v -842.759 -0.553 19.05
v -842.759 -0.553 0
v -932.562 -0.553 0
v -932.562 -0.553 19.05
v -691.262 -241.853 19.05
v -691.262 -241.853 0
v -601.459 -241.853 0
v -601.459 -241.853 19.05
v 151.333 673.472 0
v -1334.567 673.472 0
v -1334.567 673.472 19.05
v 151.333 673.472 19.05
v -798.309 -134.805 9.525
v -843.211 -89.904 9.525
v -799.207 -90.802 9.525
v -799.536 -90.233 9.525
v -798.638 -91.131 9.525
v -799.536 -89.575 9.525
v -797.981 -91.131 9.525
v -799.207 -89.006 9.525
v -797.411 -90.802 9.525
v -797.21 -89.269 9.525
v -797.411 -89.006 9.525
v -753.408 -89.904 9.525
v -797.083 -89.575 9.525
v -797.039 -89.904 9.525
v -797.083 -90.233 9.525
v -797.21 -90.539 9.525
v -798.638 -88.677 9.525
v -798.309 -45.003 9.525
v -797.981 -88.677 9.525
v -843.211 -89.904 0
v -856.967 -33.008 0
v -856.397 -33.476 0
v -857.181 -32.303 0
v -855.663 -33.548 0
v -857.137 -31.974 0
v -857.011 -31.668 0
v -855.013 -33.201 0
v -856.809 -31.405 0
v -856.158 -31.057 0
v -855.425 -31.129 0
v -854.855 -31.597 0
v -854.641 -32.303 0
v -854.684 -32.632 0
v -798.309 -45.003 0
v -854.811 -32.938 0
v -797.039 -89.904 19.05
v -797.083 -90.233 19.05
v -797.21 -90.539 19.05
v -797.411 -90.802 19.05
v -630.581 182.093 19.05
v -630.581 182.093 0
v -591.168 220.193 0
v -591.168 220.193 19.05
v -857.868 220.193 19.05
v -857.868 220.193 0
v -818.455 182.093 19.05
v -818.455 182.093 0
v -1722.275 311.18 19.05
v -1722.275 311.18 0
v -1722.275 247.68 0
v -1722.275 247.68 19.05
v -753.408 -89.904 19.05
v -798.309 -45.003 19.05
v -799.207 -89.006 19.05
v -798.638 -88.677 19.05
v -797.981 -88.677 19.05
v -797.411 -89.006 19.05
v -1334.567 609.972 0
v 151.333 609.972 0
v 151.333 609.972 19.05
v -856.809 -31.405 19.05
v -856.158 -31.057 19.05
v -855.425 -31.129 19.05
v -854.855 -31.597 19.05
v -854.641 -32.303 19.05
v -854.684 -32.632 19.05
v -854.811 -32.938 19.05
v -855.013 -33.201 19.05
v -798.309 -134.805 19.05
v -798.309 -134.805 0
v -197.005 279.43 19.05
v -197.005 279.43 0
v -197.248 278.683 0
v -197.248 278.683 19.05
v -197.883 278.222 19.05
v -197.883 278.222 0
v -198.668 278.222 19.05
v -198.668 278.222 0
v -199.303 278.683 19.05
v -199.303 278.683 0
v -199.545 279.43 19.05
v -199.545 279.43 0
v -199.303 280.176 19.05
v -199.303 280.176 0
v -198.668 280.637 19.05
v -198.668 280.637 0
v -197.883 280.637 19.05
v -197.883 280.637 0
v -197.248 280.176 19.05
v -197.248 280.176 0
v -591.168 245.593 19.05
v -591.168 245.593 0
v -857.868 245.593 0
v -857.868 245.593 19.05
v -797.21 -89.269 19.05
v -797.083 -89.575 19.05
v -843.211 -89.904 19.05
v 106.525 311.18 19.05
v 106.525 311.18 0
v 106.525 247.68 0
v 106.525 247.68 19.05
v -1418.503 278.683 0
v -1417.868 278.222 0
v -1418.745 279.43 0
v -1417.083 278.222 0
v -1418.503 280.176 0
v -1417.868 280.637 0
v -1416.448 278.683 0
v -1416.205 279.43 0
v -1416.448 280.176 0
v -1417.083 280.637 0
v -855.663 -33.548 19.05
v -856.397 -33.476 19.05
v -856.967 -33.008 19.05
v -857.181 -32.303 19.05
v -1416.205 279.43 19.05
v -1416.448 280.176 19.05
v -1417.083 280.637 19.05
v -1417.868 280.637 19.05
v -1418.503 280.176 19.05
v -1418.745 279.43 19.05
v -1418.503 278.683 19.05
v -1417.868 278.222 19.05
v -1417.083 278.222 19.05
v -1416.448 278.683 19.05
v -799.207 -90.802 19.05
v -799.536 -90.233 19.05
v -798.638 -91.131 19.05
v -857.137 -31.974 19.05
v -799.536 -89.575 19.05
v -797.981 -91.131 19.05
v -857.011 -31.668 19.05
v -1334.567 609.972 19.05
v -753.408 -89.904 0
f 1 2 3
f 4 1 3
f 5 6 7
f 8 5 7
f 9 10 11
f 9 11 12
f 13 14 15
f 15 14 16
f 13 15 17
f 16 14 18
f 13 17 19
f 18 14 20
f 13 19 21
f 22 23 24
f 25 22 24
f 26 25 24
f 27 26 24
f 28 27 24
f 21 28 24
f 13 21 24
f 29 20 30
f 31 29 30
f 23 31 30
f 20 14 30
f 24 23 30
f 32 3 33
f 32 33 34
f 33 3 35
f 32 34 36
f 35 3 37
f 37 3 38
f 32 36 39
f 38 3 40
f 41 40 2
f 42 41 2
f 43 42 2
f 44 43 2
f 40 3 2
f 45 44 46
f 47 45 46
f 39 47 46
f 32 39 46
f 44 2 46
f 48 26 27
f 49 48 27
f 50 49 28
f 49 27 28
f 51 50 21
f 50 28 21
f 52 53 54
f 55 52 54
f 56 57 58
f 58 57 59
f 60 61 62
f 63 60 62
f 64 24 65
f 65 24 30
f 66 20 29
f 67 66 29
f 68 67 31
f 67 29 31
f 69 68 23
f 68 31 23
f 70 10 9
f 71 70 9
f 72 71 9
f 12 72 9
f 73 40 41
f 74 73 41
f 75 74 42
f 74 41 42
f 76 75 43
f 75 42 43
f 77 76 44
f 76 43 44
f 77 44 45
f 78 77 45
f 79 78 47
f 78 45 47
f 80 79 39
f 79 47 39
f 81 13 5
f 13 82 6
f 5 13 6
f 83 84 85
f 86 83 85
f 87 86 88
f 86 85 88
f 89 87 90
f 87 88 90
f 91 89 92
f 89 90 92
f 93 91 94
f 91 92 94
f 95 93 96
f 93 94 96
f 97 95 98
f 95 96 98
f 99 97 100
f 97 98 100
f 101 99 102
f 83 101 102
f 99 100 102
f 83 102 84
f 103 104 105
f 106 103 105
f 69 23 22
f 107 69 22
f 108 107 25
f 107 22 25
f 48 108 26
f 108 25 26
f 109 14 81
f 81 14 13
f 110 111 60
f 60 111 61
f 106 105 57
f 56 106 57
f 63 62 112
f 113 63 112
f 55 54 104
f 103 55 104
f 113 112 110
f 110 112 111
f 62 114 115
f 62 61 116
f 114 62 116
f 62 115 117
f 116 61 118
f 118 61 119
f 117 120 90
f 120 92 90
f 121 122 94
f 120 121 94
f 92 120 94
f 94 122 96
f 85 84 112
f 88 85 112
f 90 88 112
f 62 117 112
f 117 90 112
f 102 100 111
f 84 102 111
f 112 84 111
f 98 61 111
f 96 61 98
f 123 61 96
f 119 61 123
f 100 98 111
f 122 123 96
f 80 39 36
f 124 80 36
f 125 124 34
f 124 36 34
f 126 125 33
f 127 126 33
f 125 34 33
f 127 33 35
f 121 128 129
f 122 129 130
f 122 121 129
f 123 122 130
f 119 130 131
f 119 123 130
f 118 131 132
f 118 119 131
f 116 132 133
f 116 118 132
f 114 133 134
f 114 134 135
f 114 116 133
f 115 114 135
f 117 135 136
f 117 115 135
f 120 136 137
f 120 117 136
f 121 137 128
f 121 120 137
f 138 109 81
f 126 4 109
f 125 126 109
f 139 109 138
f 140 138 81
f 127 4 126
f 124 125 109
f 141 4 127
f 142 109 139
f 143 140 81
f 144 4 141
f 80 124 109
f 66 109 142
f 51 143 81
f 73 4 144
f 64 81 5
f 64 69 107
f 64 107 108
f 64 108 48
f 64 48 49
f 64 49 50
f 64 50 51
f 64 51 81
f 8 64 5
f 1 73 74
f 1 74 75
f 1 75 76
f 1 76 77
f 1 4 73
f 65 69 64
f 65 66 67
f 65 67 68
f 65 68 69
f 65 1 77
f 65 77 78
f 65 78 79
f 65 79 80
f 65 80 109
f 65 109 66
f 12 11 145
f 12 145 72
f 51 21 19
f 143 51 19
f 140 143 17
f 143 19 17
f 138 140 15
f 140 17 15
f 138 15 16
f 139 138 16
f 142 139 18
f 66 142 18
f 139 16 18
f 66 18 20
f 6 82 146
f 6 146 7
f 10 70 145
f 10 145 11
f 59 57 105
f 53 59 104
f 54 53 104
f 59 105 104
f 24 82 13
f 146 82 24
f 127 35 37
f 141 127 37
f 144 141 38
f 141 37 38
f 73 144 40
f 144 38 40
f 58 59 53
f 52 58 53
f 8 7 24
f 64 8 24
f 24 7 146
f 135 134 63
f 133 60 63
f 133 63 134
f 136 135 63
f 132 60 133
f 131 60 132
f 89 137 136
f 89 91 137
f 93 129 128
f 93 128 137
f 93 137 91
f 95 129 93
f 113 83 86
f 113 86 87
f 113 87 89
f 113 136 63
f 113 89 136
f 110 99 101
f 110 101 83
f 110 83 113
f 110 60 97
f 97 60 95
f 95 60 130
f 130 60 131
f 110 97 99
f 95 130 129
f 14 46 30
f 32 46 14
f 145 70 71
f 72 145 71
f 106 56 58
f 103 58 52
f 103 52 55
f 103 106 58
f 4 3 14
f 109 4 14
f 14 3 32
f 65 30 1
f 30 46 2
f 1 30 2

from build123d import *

# Parameters (mm, degrees)
F0_R     = 1.27
F3_DEPTH = 19.05
F4_DEPTH = 19.05
F5_DEPTH = 19.05
F6_DEPTH = 9.525
F7_W     = 1485.9
F7_H     = 63.5
F8_DEPTH = 19.05


with BuildPart() as f3:
    # F0 (on Top) → F3 (new body)
    with BuildSketch(Plane.XY):
        Polygon((106.5247591868, 311.1795735657), (-1722.2752408132, 311.1795735657), (-1722.2752408132, 247.6795735657), (106.5247591868, 247.6795735657), (106.5247591868, 279.4295735657), align=None)
        with Locations((-1417.4752408132, 279.4295735657)):
            Circle(F0_R, mode=Mode.SUBTRACT)
        with BuildLine():
            ThreePointArc((-199.5452408132, 279.4295735657), (-198.2752408132, 280.6995735657), (-197.0052408132, 279.4295735657))
            ThreePointArc((-197.0052408132, 279.4295735657), (-198.2752408132, 278.1595735657), (-199.5452408132, 279.4295735657))
        make_face(mode=Mode.SUBTRACT)
    extrude(amount=F3_DEPTH)


with BuildPart() as f4:
    # F1 (on Top) → F4 (new body)
    with BuildSketch(Plane.XY):
        Polygon((-591.1678494178, 245.5934405844), (-724.5178494178, 245.5934405844), (-724.5178494178, 182.0934405844), (-630.580947315, 182.0934405844), (-591.1678494178, 220.1934405844), align=None)
        Polygon((-724.5178494178, 245.5934405844), (-857.8678494178, 245.5934405844), (-857.8678494178, 220.1934405844), (-818.4547515206, 182.0934405844), (-724.5178494178, 182.0934405844), align=None)
    extrude(amount=F4_DEPTH)


with BuildPart() as f5:
    # F2 (on Top) → F5 (new body)
    with BuildSketch(Plane.XY):
        Polygon((-842.7594071963, -0.5528051282), (-932.561968407, -0.5528051282), (-843.2106878017, -89.9040857336), (-798.3094071963, -45.0028051282), align=None)
        with BuildLine():
            ThreePointArc((-857.1806878017, -32.3028051282), (-857.084014808, -31.8167971691), (-856.8087134138, -31.4047795161))
            ThreePointArc((-856.8087134138, -31.4047795161), (-855.4246798426, -31.129478122), (-854.6406878017, -32.3028051282))
            ThreePointArc((-854.6406878017, -32.3028051282), (-854.7373607954, -32.7888130874), (-855.0126621896, -33.2008307404))
            ThreePointArc((-855.0126621896, -33.2008307404), (-856.3966957608, -33.4761321345), (-857.1806878017, -32.3028051282))
        make_face(mode=Mode.SUBTRACT)
        Polygon((-753.408126591, -89.9040857336), (-798.3094071963, -134.8053663389), (-691.261968407, -241.8528051282), (-601.4594071963, -241.8528051282), align=None)
        Polygon((-798.3094071963, -45.0028051282), (-843.2106878017, -89.9040857336), (-798.3094071963, -134.8053663389), (-753.408126591, -89.9040857336), align=None)
        with BuildLine():
            ThreePointArc((-797.4113815842, -89.0060601215), (-797.1360801901, -89.4180777745), (-797.0394071963, -89.9040857336))
            ThreePointArc((-797.0394071963, -89.9040857336), (-797.1360801901, -90.3900936927), (-797.4113815842, -90.8021113457))
            ThreePointArc((-797.4113815842, -90.8021113457), (-798.3094071963, -91.1740857336), (-799.2074328084, -90.8021113457))
            ThreePointArc((-799.2074328084, -90.8021113457), (-799.5794071963, -89.9040857336), (-799.2074328084, -89.0060601215))
            ThreePointArc((-799.2074328084, -89.0060601215), (-798.3094071963, -88.6340857336), (-797.4113815842, -89.0060601215))
        make_face(mode=Mode.SUBTRACT)
    extrude(amount=F5_DEPTH)

    # F2 (on Top) → F6 (cut)
    with BuildSketch(Plane.XY):
        Polygon((-798.3094071963, -45.0028051282), (-843.2106878017, -89.9040857336), (-798.3094071963, -134.8053663389), (-753.408126591, -89.9040857336), align=None)
        with BuildLine():
            ThreePointArc((-797.4113815842, -89.0060601215), (-797.1360801901, -89.4180777745), (-797.0394071963, -89.9040857336))
            ThreePointArc((-797.0394071963, -89.9040857336), (-797.1360801901, -90.3900936927), (-797.4113815842, -90.8021113457))
            ThreePointArc((-797.4113815842, -90.8021113457), (-798.3094071963, -91.1740857336), (-799.2074328084, -90.8021113457))
            ThreePointArc((-799.2074328084, -90.8021113457), (-799.5794071963, -89.9040857336), (-799.2074328084, -89.0060601215))
            ThreePointArc((-799.2074328084, -89.0060601215), (-798.3094071963, -88.6340857336), (-797.4113815842, -89.0060601215))
        make_face(mode=Mode.SUBTRACT)
    extrude(amount=F6_DEPTH, mode=Mode.SUBTRACT)


with BuildPart() as f8:
    # F7 (on Top) → F8 (new body)
    with BuildSketch(Plane.XY):
        with Locations((-591.6171892166, 641.722178936)):
            Rectangle(F7_W, F7_H)
    extrude(amount=F8_DEPTH)


solid = Compound([f3.part, f4.part, f5.part, f8.part])
